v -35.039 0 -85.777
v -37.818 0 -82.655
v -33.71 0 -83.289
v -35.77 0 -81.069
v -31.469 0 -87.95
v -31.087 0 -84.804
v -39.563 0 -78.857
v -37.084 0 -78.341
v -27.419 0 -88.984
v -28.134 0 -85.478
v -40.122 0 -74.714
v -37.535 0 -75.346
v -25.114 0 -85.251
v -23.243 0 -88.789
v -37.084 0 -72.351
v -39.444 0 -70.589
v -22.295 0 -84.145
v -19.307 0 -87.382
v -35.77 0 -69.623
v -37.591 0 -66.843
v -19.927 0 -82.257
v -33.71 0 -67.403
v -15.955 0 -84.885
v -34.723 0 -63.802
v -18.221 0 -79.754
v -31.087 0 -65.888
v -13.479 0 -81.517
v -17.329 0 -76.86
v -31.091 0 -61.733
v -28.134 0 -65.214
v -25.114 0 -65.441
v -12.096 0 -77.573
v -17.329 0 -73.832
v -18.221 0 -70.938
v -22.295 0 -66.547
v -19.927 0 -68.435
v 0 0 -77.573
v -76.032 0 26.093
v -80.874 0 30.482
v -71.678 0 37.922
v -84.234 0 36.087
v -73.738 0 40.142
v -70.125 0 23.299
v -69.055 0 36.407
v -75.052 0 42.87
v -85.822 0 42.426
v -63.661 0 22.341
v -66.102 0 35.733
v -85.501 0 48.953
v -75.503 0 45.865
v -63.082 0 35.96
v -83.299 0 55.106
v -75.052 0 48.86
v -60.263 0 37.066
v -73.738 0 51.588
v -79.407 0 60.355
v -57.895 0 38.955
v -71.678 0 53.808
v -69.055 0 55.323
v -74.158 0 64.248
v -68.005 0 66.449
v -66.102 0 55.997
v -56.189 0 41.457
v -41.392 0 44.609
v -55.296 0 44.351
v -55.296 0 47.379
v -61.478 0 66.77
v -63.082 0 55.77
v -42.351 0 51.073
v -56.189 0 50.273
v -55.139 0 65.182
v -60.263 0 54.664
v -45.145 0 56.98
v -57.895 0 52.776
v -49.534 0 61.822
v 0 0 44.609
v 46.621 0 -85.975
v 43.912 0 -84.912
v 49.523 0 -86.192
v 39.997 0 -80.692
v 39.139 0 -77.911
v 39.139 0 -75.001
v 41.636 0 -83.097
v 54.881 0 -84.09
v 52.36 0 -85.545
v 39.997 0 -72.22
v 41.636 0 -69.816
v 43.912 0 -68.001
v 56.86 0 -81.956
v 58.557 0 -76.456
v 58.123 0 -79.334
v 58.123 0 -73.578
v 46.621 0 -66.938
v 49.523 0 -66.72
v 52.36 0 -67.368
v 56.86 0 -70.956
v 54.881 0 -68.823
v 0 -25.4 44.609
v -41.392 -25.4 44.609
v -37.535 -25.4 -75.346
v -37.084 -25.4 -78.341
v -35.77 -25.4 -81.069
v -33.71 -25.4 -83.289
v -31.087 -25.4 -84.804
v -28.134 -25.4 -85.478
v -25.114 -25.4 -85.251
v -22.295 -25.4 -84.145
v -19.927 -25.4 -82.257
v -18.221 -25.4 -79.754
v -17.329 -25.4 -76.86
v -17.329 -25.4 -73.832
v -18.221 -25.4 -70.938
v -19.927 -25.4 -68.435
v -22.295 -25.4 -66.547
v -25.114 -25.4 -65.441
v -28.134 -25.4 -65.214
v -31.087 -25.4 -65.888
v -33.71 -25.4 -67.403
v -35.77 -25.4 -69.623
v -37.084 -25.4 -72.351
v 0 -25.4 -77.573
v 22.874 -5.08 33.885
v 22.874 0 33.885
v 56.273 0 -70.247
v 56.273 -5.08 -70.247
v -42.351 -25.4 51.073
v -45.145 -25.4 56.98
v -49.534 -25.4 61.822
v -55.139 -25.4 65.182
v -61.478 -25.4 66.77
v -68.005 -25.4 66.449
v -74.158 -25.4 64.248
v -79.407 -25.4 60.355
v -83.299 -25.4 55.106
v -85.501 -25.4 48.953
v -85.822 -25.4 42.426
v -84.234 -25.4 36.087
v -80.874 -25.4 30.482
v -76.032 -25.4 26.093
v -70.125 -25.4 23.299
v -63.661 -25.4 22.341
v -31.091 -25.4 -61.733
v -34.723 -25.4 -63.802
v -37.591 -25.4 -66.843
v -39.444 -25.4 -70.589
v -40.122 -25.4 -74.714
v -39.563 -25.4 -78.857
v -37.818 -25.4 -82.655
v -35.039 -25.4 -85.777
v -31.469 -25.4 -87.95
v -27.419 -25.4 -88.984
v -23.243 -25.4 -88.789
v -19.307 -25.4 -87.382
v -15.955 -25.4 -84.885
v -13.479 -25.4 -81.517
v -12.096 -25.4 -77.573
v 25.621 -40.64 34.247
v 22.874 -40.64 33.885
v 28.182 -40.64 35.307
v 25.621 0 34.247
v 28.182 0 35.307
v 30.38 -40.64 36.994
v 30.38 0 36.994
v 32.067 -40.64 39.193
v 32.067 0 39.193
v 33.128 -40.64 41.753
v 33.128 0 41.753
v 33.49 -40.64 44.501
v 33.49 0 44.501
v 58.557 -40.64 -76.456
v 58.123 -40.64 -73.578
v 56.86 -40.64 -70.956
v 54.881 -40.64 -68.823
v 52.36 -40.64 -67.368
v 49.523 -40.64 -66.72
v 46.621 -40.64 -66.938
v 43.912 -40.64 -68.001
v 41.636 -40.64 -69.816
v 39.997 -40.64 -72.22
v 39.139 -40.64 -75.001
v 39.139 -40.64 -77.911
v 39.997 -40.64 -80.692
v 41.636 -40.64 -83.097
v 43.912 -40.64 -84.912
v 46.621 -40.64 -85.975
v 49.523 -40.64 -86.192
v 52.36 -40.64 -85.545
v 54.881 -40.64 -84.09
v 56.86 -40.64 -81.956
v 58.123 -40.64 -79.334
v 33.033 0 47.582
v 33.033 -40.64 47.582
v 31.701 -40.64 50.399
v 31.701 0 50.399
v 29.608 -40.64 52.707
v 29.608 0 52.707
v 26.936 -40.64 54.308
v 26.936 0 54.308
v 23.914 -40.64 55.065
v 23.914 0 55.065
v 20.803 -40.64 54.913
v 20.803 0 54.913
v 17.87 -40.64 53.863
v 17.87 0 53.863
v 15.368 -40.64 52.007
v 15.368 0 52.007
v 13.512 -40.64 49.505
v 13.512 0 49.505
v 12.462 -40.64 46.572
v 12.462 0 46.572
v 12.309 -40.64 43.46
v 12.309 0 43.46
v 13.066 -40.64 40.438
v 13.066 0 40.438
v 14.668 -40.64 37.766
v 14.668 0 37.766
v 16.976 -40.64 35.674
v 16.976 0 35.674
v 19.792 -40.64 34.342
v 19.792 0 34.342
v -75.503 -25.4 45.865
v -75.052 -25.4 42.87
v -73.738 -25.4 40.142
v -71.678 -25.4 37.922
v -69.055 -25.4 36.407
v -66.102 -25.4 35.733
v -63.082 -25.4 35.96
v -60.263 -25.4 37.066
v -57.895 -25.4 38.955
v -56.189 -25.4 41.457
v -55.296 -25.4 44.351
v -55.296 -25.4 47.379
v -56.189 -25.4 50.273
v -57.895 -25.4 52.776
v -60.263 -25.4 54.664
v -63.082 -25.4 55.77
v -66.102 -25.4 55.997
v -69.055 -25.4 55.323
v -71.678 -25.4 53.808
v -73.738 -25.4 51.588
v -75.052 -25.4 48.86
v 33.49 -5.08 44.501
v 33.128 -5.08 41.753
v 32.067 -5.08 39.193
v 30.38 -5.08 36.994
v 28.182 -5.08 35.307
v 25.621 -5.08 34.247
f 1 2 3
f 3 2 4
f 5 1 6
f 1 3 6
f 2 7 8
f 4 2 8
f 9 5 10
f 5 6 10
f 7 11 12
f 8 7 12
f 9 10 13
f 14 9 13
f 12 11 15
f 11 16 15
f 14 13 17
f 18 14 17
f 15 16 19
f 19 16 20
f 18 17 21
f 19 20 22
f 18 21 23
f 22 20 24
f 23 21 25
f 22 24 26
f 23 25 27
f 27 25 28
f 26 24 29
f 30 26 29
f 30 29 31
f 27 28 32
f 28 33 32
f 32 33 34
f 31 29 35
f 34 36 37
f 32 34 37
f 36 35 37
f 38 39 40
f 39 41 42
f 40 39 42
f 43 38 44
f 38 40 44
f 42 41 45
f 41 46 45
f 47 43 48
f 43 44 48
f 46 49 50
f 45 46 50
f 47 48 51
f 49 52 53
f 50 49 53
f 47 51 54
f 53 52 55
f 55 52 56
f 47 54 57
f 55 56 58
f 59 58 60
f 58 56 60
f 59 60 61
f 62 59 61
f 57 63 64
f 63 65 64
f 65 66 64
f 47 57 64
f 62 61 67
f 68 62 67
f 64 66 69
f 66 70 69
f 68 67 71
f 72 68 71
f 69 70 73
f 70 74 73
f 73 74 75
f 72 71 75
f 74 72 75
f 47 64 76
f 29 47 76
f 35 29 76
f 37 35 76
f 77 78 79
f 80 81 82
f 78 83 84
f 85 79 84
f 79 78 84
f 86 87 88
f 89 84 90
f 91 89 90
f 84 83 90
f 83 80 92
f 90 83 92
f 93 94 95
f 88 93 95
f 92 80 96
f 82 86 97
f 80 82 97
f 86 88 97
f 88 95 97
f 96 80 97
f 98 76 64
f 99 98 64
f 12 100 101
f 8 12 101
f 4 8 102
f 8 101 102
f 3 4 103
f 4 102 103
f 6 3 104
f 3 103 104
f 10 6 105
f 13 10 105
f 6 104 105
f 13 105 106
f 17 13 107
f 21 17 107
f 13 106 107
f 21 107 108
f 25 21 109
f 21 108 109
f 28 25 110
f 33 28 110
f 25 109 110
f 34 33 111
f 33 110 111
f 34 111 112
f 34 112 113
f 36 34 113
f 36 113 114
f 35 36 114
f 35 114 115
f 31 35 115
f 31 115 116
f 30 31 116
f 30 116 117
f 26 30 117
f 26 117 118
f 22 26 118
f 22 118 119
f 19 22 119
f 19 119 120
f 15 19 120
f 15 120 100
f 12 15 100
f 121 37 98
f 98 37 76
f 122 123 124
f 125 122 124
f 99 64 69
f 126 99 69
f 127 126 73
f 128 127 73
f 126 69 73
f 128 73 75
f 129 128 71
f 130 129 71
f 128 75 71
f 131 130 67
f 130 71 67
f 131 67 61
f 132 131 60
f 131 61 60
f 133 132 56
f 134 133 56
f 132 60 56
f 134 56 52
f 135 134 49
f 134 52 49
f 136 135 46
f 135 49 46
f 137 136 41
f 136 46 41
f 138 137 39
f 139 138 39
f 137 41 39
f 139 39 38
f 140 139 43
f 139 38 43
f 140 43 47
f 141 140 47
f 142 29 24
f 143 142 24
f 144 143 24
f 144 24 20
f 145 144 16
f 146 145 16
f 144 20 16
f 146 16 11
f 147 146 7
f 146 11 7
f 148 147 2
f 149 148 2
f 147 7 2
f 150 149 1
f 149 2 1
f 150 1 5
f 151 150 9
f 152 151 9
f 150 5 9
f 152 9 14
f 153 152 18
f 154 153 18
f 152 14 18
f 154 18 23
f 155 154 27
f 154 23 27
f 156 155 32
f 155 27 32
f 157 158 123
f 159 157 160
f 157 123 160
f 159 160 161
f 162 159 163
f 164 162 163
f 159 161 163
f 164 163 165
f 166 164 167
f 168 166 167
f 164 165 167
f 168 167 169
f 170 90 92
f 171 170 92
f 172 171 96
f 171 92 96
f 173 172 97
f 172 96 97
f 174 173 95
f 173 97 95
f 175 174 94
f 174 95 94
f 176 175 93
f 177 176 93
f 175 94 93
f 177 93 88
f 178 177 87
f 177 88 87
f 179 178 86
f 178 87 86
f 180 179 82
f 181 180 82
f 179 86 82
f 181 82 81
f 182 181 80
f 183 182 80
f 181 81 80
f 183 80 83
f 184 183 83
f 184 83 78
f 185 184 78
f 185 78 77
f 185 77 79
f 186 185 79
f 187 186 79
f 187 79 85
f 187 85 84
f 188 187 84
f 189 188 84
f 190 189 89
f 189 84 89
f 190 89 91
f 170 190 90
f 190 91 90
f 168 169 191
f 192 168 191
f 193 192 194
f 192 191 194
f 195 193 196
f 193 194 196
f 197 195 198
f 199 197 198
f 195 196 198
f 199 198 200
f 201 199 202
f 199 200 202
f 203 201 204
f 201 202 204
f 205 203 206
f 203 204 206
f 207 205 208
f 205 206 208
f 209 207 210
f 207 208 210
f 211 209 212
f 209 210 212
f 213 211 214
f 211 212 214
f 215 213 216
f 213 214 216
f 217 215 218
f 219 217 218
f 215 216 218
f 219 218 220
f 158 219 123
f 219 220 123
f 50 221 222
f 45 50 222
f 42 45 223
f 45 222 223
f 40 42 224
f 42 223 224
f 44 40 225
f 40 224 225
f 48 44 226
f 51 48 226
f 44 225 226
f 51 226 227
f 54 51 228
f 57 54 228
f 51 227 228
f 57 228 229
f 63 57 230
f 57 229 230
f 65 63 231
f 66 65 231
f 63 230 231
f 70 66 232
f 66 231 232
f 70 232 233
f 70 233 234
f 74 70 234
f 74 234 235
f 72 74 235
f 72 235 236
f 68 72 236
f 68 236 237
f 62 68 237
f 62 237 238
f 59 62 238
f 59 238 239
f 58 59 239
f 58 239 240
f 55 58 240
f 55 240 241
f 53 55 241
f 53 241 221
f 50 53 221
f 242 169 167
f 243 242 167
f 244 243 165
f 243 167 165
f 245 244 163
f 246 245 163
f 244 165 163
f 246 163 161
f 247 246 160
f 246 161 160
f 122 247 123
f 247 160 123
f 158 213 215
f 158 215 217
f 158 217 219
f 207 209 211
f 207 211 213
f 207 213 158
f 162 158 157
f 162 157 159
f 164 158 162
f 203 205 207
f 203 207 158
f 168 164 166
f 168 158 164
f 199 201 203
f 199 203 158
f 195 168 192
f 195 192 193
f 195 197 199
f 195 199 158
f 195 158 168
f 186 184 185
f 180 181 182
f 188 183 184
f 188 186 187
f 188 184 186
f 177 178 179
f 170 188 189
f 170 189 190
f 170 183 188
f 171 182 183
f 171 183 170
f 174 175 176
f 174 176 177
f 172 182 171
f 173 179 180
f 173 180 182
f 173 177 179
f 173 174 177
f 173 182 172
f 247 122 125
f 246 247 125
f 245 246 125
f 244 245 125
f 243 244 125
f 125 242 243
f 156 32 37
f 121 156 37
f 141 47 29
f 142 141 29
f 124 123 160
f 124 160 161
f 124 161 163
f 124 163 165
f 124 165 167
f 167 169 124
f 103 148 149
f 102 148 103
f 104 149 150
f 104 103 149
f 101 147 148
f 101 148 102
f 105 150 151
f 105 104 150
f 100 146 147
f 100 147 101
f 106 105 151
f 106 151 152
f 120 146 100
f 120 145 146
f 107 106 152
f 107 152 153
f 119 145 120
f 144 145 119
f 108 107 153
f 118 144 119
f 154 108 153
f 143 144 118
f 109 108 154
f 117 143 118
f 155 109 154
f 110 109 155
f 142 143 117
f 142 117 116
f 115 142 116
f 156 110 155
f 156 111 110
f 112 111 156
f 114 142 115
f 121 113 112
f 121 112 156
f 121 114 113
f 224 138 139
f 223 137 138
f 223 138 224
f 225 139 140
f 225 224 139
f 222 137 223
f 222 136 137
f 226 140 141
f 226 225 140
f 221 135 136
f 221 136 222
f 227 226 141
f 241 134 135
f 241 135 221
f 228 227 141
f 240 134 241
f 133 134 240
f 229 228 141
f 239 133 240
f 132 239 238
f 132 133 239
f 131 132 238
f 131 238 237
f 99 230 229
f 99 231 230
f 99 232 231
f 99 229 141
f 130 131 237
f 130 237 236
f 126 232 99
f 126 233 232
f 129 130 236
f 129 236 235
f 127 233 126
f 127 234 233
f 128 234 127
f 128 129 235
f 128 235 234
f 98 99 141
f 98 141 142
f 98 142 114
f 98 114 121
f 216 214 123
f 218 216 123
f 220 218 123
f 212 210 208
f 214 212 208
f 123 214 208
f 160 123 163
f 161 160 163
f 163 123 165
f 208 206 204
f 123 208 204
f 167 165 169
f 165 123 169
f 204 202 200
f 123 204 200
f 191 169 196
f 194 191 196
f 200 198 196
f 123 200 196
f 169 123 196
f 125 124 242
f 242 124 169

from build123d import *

# Parameters (mm, degrees)
F1_DEPTH = 25.4
F3_D     = 20.32
F6_DEPTH = 40.64
F4_R     = 9.7634014132
F7_DEPTH = 5.08


with BuildPart() as f1:
    # F0 (on Front) → F1 (new body)
    with BuildSketch(Plane.XZ):
        with BuildLine():
            ThreePointArc((-31.091335527, -61.7328519498), (-35.0391851817, -85.7768409495), (-12.095825273, -77.573112528))
            ThreePointArc((-12.095825273, -77.573112528), (-11.9072622515, -76.2512958844), (-11.8442205275, -74.9175863983))
            ThreePointArc((-11.8442205275, -74.9175863983), (-17.9929049383, -63.2525889885), (-31.091335527, -61.7328519498))
        make_face()
        with BuildLine():
            ThreePointArc((-63.6605185804, 22.3406193173), (-47.9145055019, 28.8628314877), (-41.3922933315, 44.6088445662))
            ThreePointArc((-41.3922933315, 44.6088445662), (-79.4065316589, 60.3548576446), (-63.6605185804, 22.3406193173))
        make_face()
        with BuildLine():
            Line((0, -77.573112528), (0, 44.6088445662))
            Line((0, 44.6088445662), (-41.3922933315, 44.6088445662))
            ThreePointArc((-41.3922933315, 44.6088445662), (-47.9145055019, 28.8628314877), (-63.6605185804, 22.3406193173))
            Line((-63.6605185804, 22.3406193173), (-31.091335527, -61.7328519498))
            ThreePointArc((-31.091335527, -61.7328519498), (-17.9929049383, -63.2525889885), (-11.8442205275, -74.9175863983))
            ThreePointArc((-11.8442205275, -74.9175863983), (-11.9072622515, -76.2512958844), (-12.095825273, -77.573112528))
            Line((-12.095825273, -77.573112528), (0, -77.573112528))
        make_face()
    extrude(amount=F1_DEPTH)

    # F3 (through all)
    with Locations(Plane(origin=(0, 0, 0), x_dir=(1, 0, 0), z_dir=(0, 1, 0))):
        with Locations((-65.3430148959, -45.8650588989), (-27.3750796914, 75.3459855914)):
            Hole(F3_D / 2)


with BuildPart() as f6:
    # F5 (on Front) → F6 (new body)
    with BuildSketch(Plane.XZ):
        with BuildLine():
            ThreePointArc((22.8739380836, 33.8851595852), (30.380370131, 36.9944255442), (33.4896360901, 44.5008575916))
            ThreePointArc((33.4896360901, 44.5008575916), (15.3675060363, 52.007289639), (22.8739380836, 33.8851595852))
        make_face()
    extrude(amount=F6_DEPTH)


with BuildPart() as f6b:
    # F4 (on Front) → F6, piece 2 (new body)
    with BuildSketch(Plane.XZ):
        with Locations((48.7933456898, -76.4563083649)):
            Circle(F4_R)
    extrude(amount=F6_DEPTH)


with BuildPart() as f7:
    # F5 (on Front) → F7 (new body)
    with BuildSketch(Plane.XZ):
        with BuildLine():
            Line((56.2734752893, -70.247143507), (33.4896360901, 44.5008575916))
            ThreePointArc((33.4896360901, 44.5008575916), (30.380370131, 36.9944255442), (22.8739380836, 33.8851595852))
            Line((22.8739380836, 33.8851595852), (56.2734752893, -70.247143507))
        make_face()
    extrude(amount=F7_DEPTH)


solid = Compound([f1.part, f6.part, f6b.part, f7.part])
